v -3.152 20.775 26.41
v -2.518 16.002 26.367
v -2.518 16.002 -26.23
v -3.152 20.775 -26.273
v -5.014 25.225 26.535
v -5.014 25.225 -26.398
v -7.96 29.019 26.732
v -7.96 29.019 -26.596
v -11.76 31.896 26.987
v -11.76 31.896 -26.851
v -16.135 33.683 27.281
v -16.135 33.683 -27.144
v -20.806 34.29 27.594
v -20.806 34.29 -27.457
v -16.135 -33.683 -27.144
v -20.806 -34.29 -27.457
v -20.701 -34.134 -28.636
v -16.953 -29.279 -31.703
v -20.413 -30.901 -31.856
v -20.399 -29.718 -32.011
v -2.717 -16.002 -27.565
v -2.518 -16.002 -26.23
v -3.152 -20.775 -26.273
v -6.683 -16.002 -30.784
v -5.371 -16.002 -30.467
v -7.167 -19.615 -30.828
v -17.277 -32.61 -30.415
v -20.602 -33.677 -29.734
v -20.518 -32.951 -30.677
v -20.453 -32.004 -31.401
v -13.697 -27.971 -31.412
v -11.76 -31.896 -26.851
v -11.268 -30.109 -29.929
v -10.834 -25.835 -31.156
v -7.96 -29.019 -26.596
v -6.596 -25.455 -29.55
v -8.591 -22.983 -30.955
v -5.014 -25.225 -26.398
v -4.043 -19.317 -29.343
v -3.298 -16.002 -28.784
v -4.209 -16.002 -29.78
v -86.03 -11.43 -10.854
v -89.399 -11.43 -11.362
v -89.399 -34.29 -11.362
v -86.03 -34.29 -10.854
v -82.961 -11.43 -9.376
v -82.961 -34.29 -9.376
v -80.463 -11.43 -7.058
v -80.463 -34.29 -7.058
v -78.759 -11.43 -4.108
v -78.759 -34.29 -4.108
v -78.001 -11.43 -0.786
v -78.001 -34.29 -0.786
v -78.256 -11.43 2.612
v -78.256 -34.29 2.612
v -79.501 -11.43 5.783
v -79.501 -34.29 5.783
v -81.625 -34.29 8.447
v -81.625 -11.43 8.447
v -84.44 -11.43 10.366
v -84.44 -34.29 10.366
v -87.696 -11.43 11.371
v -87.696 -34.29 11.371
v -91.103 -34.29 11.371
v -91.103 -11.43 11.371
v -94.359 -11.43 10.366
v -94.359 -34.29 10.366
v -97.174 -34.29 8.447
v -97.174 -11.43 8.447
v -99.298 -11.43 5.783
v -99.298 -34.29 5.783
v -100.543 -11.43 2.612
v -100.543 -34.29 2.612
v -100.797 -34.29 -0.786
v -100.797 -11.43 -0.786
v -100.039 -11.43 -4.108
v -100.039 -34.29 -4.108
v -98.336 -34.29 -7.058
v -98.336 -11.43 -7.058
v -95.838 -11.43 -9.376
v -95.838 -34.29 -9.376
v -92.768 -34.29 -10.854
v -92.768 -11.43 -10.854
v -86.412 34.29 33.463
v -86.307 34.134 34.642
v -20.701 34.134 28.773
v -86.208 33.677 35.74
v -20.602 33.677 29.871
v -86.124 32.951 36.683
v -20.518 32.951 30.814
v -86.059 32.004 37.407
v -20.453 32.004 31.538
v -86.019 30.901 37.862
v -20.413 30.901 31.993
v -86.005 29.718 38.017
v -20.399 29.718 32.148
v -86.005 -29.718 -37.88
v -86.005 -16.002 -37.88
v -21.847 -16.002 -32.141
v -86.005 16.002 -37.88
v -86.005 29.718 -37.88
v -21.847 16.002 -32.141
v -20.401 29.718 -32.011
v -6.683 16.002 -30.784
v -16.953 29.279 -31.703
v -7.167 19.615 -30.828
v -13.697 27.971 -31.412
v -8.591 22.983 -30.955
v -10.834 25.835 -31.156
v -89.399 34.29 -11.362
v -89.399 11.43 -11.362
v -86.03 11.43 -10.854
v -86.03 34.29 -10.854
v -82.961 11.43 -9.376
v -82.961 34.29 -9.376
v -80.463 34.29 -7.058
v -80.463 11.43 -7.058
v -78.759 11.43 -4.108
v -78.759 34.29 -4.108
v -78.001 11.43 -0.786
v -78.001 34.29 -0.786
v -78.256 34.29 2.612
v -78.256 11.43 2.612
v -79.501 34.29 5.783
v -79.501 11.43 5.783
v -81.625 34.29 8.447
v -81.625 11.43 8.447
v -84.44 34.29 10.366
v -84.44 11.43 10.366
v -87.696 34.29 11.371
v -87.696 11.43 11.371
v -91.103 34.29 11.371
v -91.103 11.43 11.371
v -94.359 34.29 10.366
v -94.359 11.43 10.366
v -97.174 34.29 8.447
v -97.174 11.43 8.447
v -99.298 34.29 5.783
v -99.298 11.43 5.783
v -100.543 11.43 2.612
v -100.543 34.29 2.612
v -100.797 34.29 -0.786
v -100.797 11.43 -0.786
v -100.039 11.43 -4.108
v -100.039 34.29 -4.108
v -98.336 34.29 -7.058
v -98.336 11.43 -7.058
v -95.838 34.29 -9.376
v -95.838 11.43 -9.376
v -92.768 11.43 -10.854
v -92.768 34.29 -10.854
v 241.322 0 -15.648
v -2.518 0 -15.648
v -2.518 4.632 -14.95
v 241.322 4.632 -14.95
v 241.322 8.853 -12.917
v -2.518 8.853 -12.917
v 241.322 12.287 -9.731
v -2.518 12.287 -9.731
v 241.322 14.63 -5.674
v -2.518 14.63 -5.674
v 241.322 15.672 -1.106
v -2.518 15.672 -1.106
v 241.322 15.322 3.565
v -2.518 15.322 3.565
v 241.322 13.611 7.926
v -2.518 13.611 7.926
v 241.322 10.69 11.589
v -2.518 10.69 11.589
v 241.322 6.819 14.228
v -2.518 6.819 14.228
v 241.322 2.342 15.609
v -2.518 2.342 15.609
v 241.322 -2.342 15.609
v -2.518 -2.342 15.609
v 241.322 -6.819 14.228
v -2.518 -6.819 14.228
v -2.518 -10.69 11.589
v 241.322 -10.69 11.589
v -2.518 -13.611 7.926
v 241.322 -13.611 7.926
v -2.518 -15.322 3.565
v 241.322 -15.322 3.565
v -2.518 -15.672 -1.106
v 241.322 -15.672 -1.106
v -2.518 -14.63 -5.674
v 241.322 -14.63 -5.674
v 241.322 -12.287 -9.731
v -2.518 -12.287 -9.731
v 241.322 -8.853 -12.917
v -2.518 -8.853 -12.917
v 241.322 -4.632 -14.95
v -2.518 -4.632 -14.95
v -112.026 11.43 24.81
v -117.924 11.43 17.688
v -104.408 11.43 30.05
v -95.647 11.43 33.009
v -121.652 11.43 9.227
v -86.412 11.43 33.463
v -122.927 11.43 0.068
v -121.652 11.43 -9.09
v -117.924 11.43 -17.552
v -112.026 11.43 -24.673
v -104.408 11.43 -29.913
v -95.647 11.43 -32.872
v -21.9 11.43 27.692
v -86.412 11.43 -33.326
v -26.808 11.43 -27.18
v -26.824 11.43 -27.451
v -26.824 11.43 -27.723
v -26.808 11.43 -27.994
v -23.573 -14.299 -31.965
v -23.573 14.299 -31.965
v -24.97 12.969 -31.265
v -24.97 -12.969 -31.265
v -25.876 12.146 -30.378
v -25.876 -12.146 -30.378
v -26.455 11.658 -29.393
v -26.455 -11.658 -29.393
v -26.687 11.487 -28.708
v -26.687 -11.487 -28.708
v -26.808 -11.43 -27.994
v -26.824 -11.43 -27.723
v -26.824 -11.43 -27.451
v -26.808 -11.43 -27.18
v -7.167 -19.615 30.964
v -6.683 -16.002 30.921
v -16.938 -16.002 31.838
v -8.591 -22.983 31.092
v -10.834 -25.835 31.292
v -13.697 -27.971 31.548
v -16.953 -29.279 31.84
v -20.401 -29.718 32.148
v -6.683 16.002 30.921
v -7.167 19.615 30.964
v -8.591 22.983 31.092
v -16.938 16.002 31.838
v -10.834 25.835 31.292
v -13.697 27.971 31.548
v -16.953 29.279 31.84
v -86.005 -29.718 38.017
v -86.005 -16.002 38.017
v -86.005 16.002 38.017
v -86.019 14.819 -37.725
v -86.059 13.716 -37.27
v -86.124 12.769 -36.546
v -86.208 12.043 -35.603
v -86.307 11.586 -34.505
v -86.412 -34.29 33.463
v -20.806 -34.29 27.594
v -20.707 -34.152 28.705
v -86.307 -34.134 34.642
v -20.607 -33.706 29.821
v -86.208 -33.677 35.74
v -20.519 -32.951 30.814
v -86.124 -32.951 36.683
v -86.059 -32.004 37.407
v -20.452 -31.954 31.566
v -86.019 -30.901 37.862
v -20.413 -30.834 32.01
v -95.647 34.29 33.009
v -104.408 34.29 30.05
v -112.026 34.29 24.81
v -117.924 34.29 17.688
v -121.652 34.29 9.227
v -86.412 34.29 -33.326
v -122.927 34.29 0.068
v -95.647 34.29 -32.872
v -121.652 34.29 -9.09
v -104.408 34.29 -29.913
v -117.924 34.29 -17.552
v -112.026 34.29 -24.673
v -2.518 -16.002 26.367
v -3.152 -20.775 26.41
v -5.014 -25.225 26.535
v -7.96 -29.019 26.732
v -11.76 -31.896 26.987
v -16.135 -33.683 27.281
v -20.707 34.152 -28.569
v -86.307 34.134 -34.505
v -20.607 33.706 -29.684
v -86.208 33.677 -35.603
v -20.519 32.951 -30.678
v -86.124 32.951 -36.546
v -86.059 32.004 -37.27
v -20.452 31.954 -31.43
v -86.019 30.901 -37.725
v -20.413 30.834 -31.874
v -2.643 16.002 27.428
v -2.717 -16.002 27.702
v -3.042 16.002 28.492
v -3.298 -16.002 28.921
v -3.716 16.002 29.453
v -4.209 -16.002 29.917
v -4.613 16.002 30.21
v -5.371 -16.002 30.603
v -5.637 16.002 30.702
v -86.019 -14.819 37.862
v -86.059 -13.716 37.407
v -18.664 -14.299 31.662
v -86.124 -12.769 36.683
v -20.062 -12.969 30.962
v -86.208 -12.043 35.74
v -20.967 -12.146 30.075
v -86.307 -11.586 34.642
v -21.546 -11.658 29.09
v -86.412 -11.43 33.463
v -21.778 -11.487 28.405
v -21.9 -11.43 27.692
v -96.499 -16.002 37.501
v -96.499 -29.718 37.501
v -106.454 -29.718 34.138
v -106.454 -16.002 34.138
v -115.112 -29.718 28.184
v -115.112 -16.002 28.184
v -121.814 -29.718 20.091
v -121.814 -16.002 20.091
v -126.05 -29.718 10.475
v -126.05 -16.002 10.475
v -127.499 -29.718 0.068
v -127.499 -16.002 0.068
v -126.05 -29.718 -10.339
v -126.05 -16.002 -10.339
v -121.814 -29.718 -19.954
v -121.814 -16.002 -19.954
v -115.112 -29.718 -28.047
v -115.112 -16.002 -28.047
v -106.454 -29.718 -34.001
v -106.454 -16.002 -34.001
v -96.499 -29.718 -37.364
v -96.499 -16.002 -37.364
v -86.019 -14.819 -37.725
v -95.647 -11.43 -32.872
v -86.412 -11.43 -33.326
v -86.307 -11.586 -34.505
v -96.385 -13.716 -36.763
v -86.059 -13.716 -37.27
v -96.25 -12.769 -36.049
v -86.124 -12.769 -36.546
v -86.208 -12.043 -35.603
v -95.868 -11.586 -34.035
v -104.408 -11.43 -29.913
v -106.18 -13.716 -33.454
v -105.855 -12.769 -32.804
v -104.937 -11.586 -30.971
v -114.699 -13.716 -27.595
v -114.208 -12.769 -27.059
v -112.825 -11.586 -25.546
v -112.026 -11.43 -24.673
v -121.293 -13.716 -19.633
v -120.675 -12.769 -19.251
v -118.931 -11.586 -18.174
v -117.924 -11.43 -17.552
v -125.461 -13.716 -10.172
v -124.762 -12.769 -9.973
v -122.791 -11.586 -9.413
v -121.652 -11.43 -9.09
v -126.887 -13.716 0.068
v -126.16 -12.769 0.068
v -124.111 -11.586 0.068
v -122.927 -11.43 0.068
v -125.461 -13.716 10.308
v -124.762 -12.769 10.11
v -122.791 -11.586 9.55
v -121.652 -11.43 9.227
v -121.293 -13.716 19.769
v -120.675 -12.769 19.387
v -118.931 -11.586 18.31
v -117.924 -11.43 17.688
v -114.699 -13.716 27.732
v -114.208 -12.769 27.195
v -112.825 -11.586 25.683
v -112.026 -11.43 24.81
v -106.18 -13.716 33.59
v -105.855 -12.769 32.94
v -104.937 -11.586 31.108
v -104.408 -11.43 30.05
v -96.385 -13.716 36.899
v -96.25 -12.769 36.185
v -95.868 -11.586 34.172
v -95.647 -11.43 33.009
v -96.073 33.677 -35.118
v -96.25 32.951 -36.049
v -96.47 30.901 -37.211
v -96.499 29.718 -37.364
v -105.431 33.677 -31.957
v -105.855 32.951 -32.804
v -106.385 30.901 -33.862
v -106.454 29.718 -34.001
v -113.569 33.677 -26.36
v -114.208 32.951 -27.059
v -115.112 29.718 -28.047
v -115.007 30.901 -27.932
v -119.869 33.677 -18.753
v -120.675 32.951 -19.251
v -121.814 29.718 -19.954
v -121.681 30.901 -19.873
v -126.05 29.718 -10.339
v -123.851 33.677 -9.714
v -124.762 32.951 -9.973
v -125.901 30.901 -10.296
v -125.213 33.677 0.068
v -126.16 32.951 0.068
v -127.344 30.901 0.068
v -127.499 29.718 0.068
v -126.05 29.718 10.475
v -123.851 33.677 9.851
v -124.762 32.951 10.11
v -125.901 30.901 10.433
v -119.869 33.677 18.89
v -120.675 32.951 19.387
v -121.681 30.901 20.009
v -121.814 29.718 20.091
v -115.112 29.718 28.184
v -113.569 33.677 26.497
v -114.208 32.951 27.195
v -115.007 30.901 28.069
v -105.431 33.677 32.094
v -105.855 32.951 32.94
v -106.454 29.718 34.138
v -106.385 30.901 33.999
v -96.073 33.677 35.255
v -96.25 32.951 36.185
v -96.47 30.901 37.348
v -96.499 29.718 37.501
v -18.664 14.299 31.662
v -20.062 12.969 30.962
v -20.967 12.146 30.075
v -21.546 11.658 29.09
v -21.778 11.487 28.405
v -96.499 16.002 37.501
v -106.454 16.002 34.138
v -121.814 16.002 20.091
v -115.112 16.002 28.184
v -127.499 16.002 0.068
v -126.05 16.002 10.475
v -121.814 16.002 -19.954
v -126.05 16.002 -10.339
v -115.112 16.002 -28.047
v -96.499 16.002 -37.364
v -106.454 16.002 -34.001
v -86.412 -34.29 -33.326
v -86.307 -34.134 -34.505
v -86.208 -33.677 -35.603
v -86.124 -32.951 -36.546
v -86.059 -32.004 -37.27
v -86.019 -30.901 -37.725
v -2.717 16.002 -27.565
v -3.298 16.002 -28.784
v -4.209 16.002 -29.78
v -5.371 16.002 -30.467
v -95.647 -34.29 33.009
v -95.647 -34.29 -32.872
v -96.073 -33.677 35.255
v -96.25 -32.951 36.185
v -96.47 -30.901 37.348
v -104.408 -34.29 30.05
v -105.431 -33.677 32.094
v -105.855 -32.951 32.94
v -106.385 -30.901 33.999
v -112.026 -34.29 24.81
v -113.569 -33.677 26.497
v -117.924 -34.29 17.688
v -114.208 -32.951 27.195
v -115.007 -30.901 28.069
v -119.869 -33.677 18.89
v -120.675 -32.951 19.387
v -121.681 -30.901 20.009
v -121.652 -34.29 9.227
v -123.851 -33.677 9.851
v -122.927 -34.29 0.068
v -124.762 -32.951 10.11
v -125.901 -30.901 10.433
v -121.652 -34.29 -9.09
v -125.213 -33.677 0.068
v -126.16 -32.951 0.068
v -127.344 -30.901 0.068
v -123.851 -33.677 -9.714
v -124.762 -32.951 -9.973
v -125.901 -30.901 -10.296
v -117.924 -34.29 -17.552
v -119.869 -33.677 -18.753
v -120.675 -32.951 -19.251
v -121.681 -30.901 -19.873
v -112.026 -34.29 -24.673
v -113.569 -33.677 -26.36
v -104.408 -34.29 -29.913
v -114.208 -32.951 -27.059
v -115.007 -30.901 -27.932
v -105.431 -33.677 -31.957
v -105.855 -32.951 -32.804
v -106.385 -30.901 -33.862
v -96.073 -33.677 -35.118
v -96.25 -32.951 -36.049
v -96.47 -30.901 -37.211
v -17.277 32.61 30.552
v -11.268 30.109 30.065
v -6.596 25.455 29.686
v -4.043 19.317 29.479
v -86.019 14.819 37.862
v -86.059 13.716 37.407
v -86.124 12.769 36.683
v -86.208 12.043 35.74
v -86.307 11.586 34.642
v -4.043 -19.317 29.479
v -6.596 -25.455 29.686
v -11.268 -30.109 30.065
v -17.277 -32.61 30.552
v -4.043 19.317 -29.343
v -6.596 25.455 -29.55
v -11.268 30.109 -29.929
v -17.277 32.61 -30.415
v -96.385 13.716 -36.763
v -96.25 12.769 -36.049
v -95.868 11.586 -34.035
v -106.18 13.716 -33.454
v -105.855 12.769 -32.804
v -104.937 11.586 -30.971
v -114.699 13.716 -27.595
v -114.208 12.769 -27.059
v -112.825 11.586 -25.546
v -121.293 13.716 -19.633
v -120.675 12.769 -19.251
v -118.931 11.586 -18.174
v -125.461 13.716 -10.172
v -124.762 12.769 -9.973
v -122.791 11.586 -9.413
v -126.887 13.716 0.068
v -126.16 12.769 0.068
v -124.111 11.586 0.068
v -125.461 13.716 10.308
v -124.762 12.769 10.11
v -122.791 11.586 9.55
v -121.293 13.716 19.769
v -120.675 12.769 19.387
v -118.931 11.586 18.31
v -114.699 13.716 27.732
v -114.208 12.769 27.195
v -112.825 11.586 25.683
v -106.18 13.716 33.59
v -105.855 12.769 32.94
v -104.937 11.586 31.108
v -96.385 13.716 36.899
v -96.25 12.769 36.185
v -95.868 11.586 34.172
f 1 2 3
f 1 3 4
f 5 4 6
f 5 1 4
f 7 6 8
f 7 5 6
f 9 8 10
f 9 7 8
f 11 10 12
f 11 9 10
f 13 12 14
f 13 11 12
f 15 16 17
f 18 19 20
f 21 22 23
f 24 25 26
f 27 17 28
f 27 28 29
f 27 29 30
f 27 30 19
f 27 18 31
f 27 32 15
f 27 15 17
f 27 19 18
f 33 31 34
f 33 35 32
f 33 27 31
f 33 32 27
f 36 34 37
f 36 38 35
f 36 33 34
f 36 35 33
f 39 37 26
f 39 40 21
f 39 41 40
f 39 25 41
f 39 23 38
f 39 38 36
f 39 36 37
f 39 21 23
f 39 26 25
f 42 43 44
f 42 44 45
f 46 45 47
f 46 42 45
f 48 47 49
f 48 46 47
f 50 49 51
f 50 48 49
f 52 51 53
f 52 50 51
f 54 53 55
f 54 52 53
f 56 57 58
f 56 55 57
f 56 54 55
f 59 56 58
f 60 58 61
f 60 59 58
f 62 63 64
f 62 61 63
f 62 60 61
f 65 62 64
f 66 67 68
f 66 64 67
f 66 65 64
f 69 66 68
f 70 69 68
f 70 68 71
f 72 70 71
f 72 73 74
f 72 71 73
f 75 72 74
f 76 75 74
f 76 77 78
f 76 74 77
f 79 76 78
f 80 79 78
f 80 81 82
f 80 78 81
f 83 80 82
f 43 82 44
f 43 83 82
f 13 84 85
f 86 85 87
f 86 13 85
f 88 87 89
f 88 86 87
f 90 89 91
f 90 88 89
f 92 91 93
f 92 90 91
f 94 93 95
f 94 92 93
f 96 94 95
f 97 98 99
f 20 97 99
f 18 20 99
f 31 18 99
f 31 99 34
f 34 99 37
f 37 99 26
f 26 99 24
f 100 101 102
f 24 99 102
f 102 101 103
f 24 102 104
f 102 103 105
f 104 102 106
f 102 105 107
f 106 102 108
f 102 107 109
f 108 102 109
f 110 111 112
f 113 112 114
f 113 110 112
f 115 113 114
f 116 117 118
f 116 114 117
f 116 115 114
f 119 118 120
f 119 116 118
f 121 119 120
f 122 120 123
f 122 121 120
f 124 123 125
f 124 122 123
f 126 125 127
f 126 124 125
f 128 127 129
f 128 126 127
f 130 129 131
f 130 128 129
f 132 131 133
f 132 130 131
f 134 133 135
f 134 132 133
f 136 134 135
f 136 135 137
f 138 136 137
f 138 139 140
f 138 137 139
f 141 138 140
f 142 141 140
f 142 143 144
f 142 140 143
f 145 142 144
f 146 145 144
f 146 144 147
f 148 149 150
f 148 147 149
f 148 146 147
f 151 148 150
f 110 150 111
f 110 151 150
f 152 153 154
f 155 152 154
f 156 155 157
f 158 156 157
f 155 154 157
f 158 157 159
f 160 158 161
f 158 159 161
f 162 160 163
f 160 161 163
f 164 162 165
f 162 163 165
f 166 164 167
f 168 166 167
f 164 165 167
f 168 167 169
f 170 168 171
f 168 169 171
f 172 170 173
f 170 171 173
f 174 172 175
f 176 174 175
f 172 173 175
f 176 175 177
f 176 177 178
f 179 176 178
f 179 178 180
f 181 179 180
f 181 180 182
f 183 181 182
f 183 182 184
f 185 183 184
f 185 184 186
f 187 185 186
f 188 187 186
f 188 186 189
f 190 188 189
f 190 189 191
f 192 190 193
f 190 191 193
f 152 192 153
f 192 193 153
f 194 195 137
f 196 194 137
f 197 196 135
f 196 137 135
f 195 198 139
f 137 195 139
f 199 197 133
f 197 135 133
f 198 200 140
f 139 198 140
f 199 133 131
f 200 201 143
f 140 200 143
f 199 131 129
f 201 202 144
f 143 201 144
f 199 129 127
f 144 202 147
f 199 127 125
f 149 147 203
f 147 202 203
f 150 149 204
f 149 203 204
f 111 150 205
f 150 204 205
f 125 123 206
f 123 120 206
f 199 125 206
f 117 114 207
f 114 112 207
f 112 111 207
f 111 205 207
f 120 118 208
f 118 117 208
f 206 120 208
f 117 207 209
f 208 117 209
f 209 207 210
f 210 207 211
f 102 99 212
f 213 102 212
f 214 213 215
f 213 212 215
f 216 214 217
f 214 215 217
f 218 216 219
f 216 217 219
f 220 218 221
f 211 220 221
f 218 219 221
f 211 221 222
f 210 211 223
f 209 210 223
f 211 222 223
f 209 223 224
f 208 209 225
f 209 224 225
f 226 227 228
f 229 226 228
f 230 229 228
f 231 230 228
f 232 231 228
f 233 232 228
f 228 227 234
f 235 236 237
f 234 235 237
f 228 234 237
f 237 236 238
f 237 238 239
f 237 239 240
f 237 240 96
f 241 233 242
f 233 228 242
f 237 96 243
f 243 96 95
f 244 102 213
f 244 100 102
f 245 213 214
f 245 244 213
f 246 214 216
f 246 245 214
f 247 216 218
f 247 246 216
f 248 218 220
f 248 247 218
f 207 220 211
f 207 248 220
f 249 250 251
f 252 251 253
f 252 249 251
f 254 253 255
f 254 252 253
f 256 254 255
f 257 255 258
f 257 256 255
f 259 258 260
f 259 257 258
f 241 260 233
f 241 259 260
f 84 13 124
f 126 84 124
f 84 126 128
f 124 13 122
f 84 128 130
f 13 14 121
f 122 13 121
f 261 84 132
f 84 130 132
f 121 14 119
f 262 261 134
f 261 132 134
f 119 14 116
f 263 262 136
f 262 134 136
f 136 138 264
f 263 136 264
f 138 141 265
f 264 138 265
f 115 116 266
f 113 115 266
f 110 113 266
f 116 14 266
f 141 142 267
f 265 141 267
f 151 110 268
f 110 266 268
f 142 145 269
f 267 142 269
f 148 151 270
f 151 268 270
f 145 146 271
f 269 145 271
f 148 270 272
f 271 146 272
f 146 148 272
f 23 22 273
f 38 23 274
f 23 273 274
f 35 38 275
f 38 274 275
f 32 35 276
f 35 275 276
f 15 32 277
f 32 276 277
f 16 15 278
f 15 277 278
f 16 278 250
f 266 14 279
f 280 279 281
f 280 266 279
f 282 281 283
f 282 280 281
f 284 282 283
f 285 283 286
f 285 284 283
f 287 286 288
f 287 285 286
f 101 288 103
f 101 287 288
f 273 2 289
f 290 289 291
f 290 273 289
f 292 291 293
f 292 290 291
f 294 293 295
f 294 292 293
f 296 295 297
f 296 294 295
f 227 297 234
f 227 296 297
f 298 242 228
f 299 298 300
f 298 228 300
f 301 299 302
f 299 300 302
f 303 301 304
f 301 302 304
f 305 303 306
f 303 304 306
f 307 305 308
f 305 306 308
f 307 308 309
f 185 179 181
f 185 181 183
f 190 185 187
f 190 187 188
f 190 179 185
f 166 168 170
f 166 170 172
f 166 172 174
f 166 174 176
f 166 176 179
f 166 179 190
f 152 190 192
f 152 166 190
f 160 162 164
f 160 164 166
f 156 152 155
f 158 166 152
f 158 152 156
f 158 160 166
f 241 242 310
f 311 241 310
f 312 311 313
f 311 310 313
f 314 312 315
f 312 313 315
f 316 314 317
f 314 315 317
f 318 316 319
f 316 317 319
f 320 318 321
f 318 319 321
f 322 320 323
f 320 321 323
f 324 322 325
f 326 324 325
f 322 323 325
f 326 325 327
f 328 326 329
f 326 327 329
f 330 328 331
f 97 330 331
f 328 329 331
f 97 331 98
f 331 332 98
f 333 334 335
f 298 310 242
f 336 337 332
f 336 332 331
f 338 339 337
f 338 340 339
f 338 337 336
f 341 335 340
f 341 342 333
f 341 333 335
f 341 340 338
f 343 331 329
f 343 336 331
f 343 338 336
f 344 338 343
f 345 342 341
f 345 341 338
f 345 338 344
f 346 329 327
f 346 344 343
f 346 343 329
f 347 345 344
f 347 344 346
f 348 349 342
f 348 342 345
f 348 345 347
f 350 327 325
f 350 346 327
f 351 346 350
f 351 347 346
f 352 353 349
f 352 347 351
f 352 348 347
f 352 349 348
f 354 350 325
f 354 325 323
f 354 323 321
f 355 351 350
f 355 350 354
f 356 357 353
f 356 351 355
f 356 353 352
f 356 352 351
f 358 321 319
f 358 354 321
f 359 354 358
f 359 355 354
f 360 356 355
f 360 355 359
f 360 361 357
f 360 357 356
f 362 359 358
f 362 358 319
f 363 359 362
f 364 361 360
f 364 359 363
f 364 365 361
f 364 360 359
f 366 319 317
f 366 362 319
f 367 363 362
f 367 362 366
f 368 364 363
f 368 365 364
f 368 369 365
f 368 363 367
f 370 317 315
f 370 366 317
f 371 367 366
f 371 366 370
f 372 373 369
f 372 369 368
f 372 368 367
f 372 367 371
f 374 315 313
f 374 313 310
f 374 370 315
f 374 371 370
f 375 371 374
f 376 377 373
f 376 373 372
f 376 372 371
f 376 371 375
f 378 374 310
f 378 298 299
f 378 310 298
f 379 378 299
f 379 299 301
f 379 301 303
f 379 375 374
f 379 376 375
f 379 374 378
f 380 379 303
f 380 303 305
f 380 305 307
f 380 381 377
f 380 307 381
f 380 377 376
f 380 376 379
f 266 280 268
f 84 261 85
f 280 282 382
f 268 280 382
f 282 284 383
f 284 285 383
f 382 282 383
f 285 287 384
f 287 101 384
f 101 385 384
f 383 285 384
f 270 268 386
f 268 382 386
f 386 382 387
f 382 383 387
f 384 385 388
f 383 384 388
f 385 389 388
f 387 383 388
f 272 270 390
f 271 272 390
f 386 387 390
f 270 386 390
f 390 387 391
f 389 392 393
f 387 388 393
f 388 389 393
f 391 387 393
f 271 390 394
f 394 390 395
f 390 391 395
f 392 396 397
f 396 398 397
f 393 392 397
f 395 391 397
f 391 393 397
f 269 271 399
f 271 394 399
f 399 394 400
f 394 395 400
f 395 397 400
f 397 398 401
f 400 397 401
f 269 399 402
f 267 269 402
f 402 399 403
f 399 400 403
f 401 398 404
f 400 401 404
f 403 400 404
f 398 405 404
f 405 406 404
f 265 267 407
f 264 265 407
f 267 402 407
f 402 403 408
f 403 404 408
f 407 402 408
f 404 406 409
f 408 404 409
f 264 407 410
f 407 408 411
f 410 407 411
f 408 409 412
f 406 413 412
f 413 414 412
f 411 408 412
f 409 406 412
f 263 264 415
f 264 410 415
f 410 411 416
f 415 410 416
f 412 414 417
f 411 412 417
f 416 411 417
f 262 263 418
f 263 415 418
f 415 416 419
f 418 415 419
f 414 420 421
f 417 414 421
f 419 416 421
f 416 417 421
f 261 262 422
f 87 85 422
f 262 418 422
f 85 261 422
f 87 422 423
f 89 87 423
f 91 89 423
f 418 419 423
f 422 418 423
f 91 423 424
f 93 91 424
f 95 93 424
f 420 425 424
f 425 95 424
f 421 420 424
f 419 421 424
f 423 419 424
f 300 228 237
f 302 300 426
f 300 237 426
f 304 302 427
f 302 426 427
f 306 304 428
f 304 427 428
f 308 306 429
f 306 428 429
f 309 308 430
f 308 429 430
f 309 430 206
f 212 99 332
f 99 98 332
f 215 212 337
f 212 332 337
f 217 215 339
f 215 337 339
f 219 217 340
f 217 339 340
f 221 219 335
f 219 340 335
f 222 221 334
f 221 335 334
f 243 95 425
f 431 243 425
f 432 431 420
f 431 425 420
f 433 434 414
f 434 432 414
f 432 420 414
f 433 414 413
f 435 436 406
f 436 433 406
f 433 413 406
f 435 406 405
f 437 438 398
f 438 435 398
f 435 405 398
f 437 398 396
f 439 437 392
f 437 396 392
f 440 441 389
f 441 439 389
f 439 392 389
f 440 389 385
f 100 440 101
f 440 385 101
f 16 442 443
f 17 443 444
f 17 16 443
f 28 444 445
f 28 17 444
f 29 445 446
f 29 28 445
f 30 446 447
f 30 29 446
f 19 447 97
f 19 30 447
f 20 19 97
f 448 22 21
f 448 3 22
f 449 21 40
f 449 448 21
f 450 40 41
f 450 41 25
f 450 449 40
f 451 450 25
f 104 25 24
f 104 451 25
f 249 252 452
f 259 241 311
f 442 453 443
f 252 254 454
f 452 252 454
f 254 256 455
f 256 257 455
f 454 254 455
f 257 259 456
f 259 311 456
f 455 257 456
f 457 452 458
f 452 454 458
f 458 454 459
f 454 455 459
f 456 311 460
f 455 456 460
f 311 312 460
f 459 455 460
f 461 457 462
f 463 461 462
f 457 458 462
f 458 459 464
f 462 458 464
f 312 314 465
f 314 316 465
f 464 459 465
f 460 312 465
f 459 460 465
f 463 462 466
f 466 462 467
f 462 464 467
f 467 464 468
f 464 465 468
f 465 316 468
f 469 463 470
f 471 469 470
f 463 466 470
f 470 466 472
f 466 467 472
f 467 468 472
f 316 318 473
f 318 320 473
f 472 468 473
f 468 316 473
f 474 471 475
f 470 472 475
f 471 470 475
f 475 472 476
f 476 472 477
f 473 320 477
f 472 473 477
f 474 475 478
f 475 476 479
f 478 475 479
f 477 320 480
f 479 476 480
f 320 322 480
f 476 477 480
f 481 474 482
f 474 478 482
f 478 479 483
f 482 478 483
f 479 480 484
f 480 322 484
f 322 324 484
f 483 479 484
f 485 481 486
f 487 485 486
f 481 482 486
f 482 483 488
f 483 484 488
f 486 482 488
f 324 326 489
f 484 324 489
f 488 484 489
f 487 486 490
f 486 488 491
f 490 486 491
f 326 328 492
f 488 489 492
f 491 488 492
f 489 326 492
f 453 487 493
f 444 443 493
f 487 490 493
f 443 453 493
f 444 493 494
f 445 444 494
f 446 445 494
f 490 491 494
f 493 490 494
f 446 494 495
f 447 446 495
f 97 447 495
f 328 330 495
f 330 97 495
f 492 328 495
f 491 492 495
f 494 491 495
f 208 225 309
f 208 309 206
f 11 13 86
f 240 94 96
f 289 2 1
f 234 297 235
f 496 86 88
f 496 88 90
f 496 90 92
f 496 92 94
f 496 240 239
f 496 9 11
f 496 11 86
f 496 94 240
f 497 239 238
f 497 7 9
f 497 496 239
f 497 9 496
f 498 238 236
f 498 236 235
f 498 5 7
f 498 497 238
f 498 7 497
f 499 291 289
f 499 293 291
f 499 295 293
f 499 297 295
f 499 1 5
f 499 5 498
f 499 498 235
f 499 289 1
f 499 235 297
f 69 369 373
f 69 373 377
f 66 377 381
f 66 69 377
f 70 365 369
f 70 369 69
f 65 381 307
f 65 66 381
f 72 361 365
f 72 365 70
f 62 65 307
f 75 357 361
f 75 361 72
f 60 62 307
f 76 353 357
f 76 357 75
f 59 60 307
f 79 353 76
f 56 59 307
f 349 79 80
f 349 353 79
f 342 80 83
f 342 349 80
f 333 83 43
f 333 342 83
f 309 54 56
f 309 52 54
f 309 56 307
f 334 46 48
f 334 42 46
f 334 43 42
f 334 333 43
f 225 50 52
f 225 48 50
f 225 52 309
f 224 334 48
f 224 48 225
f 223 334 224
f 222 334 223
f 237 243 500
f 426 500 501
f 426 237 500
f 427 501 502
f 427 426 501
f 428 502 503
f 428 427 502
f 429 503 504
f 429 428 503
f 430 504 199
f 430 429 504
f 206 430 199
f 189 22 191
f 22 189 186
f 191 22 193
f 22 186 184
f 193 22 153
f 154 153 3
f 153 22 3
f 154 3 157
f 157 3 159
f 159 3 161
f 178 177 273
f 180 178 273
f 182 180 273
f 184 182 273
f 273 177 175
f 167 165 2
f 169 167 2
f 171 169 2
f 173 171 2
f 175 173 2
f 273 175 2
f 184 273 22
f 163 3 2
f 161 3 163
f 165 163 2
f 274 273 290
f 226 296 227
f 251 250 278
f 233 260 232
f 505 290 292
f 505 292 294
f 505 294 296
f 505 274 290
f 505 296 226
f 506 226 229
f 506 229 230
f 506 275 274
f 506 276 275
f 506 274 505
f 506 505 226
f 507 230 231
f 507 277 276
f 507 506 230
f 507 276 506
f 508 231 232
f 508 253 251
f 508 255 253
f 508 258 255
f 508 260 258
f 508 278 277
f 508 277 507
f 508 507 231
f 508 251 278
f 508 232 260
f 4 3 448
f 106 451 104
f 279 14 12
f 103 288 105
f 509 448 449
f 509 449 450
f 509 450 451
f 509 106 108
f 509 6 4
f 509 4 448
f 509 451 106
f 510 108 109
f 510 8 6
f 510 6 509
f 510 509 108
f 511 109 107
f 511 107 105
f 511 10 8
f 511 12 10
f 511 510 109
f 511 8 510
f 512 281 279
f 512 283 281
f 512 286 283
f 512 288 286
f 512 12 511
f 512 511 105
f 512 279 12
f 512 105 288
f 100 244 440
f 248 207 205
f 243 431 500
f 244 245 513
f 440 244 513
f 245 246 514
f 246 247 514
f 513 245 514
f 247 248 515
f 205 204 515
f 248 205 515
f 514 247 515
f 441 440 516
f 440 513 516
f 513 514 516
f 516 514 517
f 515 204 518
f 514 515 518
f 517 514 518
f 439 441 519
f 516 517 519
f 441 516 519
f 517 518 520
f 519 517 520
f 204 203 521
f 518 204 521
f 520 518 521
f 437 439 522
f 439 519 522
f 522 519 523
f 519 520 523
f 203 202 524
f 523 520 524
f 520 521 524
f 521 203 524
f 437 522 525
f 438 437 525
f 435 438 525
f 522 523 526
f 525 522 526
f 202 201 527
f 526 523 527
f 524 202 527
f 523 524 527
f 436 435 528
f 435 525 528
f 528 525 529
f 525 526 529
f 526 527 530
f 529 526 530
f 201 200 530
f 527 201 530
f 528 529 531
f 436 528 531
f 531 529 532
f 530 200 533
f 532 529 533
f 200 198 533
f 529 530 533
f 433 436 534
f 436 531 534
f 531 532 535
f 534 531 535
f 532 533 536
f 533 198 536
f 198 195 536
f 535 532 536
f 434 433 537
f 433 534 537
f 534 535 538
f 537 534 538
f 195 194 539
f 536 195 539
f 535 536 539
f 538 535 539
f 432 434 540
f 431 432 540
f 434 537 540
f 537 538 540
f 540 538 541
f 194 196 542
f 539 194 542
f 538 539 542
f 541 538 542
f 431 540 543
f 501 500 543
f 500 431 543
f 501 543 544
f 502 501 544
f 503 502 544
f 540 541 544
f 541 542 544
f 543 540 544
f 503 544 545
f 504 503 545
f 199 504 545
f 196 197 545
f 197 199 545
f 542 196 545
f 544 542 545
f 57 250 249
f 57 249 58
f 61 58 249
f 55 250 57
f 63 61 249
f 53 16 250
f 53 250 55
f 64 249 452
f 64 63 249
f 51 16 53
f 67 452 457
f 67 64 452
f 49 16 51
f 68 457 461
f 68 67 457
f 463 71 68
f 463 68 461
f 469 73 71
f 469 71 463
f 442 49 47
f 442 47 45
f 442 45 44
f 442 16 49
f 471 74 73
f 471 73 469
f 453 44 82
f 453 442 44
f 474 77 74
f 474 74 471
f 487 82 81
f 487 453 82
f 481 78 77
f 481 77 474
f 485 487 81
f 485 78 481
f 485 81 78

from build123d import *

# Parameters (mm, degrees)
SKETCH4_R               = 2.619375
BOSS_EXTRUDE2_DEPTH     = 40.64
BOSS_EXTRUDE4_DEPTH     = 5.715
CUT_EXTRUDE2_DEPTH      = 43.16105899
CUT_EXTRUDE2_DEPTH_BACK = 43.16105899
SKETCH16_W              = 25.774361669
SKETCH16_H              = 3.81
CUT_EXTRUDE3_DEPTH      = 43.691650237
CUT_EXTRUDE3_DEPTH_BACK = 43.691650237
SKETCH17_R              = 1.905
FILLET1_R               = 3.048
FILLET2_R               = 0.762
SCALE1_SCALE            = 6


with BuildPart() as part:
    # Sketch4 → Boss-Extrude2 (new body)
    with BuildSketch(Plane(origin=(0, 0, 0), x_dir=(0, 0, -1), z_dir=(1, 0, 0))):
        Circle(SKETCH4_R)
    extrude(amount=BOSS_EXTRUDE2_DEPTH)

    # Sketch13 → Boss-Extrude4 (add, symmetric)
    with BuildSketch(Plane(origin=(0, 0, 0), x_dir=(1, 0, 0), z_dir=(0, 1, 0))):
        with BuildLine():
            Line((0, 5.08), (0, -5.08))
            Line((0, -5.08), (-13.91443545, -6.324743387))
            ThreePointArc((-13.91443545, -6.324743387), (-20.830227899, 0), (-13.91443545, 6.324743387))
            Line((-13.91443545, 6.324743387), (0, 5.08))
        make_face()
    extrude(amount=BOSS_EXTRUDE4_DEPTH, both=True)

    # Sketch16 → Cut-Extrude2 (cut, two sides: drawn at the far end of the back side and taken through both)
    with BuildSketch(Plane(origin=(0.450833644, 0, 5.039669783), x_dir=(0.996022580554145, 0, -0.08910117297915686), z_dir=(0.08910117297915686, 0, 0.996022580554145)).offset(-CUT_EXTRUDE2_DEPTH_BACK)):
        with Locations((-16.514814794, 0)):
            Rectangle(SKETCH16_W, SKETCH16_H)
    extrude(amount=CUT_EXTRUDE2_DEPTH + CUT_EXTRUDE2_DEPTH_BACK, mode=Mode.SUBTRACT)

    # Sketch17 → Cut-Extrude3 (cut, two sides: drawn at the far end of the back side and taken through both)
    with BuildSketch(Plane.XZ.offset(5.715).offset(-CUT_EXTRUDE3_DEPTH_BACK)):
        with Locations(Location((-14.480227899, 0, 0), (0, 0, 270))):
            Circle(SKETCH17_R)
    extrude(amount=CUT_EXTRUDE3_DEPTH + CUT_EXTRUDE3_DEPTH_BACK, mode=Mode.SUBTRACT)

    # Fillet1
    fillet1_edges = [part.edges().sort_by_distance(p)[0] for p in [
        (0, -5.715, 0),
        (0, 5.715, 0),
    ]]
    fillet(fillet1_edges, radius=FILLET1_R)

    # Fillet2
    fillet2_edges = [part.edges().sort_by_distance(p)[0] for p in [
        (-8.538403572, -1.905, 5.843819805),
        (-3.162371693, 0, 5.362896224),
        (-8.538403572, 1.905, 5.843819805),
        (-9.02202226, 1.905, -5.887082873),
        (-20.830227899, 1.905, 0),
        (-4.12960907, 0, -5.44942236),
        (-20.830227899, -1.905, 0),
        (-9.02202226, -1.905, -5.887082873),
        (0, 0, -5.08),
        (0, 0, 5.08),
        (-8.481217725, 5.715, -5.838704132),
        (-8.481217725, -5.715, -5.838704132),
        (-0.894886956, 4.824407754, -5.160053885),
        (-0.894886956, -4.824407754, -5.160053885),
        (-0.894886956, 4.824407754, 5.160053885),
        (-0.894886956, -4.824407754, 5.160053885),
        (-20.830227899, -5.715, 0),
        (-8.481217725, -5.715, 5.838704132),
        (-20.830227899, 5.715, 0),
        (-8.481217725, 5.715, 5.838704132),
    ]]
    fillet(fillet2_edges, radius=FILLET2_R)


with BuildPart() as part_1:
    # Scale1: scaled about (0.503603853, 0, -0.013653442)
    add(part.part.scale(SCALE1_SCALE).moved(Location((-2.518019265, 0, 0.06826721))))


solid = part_1.part
